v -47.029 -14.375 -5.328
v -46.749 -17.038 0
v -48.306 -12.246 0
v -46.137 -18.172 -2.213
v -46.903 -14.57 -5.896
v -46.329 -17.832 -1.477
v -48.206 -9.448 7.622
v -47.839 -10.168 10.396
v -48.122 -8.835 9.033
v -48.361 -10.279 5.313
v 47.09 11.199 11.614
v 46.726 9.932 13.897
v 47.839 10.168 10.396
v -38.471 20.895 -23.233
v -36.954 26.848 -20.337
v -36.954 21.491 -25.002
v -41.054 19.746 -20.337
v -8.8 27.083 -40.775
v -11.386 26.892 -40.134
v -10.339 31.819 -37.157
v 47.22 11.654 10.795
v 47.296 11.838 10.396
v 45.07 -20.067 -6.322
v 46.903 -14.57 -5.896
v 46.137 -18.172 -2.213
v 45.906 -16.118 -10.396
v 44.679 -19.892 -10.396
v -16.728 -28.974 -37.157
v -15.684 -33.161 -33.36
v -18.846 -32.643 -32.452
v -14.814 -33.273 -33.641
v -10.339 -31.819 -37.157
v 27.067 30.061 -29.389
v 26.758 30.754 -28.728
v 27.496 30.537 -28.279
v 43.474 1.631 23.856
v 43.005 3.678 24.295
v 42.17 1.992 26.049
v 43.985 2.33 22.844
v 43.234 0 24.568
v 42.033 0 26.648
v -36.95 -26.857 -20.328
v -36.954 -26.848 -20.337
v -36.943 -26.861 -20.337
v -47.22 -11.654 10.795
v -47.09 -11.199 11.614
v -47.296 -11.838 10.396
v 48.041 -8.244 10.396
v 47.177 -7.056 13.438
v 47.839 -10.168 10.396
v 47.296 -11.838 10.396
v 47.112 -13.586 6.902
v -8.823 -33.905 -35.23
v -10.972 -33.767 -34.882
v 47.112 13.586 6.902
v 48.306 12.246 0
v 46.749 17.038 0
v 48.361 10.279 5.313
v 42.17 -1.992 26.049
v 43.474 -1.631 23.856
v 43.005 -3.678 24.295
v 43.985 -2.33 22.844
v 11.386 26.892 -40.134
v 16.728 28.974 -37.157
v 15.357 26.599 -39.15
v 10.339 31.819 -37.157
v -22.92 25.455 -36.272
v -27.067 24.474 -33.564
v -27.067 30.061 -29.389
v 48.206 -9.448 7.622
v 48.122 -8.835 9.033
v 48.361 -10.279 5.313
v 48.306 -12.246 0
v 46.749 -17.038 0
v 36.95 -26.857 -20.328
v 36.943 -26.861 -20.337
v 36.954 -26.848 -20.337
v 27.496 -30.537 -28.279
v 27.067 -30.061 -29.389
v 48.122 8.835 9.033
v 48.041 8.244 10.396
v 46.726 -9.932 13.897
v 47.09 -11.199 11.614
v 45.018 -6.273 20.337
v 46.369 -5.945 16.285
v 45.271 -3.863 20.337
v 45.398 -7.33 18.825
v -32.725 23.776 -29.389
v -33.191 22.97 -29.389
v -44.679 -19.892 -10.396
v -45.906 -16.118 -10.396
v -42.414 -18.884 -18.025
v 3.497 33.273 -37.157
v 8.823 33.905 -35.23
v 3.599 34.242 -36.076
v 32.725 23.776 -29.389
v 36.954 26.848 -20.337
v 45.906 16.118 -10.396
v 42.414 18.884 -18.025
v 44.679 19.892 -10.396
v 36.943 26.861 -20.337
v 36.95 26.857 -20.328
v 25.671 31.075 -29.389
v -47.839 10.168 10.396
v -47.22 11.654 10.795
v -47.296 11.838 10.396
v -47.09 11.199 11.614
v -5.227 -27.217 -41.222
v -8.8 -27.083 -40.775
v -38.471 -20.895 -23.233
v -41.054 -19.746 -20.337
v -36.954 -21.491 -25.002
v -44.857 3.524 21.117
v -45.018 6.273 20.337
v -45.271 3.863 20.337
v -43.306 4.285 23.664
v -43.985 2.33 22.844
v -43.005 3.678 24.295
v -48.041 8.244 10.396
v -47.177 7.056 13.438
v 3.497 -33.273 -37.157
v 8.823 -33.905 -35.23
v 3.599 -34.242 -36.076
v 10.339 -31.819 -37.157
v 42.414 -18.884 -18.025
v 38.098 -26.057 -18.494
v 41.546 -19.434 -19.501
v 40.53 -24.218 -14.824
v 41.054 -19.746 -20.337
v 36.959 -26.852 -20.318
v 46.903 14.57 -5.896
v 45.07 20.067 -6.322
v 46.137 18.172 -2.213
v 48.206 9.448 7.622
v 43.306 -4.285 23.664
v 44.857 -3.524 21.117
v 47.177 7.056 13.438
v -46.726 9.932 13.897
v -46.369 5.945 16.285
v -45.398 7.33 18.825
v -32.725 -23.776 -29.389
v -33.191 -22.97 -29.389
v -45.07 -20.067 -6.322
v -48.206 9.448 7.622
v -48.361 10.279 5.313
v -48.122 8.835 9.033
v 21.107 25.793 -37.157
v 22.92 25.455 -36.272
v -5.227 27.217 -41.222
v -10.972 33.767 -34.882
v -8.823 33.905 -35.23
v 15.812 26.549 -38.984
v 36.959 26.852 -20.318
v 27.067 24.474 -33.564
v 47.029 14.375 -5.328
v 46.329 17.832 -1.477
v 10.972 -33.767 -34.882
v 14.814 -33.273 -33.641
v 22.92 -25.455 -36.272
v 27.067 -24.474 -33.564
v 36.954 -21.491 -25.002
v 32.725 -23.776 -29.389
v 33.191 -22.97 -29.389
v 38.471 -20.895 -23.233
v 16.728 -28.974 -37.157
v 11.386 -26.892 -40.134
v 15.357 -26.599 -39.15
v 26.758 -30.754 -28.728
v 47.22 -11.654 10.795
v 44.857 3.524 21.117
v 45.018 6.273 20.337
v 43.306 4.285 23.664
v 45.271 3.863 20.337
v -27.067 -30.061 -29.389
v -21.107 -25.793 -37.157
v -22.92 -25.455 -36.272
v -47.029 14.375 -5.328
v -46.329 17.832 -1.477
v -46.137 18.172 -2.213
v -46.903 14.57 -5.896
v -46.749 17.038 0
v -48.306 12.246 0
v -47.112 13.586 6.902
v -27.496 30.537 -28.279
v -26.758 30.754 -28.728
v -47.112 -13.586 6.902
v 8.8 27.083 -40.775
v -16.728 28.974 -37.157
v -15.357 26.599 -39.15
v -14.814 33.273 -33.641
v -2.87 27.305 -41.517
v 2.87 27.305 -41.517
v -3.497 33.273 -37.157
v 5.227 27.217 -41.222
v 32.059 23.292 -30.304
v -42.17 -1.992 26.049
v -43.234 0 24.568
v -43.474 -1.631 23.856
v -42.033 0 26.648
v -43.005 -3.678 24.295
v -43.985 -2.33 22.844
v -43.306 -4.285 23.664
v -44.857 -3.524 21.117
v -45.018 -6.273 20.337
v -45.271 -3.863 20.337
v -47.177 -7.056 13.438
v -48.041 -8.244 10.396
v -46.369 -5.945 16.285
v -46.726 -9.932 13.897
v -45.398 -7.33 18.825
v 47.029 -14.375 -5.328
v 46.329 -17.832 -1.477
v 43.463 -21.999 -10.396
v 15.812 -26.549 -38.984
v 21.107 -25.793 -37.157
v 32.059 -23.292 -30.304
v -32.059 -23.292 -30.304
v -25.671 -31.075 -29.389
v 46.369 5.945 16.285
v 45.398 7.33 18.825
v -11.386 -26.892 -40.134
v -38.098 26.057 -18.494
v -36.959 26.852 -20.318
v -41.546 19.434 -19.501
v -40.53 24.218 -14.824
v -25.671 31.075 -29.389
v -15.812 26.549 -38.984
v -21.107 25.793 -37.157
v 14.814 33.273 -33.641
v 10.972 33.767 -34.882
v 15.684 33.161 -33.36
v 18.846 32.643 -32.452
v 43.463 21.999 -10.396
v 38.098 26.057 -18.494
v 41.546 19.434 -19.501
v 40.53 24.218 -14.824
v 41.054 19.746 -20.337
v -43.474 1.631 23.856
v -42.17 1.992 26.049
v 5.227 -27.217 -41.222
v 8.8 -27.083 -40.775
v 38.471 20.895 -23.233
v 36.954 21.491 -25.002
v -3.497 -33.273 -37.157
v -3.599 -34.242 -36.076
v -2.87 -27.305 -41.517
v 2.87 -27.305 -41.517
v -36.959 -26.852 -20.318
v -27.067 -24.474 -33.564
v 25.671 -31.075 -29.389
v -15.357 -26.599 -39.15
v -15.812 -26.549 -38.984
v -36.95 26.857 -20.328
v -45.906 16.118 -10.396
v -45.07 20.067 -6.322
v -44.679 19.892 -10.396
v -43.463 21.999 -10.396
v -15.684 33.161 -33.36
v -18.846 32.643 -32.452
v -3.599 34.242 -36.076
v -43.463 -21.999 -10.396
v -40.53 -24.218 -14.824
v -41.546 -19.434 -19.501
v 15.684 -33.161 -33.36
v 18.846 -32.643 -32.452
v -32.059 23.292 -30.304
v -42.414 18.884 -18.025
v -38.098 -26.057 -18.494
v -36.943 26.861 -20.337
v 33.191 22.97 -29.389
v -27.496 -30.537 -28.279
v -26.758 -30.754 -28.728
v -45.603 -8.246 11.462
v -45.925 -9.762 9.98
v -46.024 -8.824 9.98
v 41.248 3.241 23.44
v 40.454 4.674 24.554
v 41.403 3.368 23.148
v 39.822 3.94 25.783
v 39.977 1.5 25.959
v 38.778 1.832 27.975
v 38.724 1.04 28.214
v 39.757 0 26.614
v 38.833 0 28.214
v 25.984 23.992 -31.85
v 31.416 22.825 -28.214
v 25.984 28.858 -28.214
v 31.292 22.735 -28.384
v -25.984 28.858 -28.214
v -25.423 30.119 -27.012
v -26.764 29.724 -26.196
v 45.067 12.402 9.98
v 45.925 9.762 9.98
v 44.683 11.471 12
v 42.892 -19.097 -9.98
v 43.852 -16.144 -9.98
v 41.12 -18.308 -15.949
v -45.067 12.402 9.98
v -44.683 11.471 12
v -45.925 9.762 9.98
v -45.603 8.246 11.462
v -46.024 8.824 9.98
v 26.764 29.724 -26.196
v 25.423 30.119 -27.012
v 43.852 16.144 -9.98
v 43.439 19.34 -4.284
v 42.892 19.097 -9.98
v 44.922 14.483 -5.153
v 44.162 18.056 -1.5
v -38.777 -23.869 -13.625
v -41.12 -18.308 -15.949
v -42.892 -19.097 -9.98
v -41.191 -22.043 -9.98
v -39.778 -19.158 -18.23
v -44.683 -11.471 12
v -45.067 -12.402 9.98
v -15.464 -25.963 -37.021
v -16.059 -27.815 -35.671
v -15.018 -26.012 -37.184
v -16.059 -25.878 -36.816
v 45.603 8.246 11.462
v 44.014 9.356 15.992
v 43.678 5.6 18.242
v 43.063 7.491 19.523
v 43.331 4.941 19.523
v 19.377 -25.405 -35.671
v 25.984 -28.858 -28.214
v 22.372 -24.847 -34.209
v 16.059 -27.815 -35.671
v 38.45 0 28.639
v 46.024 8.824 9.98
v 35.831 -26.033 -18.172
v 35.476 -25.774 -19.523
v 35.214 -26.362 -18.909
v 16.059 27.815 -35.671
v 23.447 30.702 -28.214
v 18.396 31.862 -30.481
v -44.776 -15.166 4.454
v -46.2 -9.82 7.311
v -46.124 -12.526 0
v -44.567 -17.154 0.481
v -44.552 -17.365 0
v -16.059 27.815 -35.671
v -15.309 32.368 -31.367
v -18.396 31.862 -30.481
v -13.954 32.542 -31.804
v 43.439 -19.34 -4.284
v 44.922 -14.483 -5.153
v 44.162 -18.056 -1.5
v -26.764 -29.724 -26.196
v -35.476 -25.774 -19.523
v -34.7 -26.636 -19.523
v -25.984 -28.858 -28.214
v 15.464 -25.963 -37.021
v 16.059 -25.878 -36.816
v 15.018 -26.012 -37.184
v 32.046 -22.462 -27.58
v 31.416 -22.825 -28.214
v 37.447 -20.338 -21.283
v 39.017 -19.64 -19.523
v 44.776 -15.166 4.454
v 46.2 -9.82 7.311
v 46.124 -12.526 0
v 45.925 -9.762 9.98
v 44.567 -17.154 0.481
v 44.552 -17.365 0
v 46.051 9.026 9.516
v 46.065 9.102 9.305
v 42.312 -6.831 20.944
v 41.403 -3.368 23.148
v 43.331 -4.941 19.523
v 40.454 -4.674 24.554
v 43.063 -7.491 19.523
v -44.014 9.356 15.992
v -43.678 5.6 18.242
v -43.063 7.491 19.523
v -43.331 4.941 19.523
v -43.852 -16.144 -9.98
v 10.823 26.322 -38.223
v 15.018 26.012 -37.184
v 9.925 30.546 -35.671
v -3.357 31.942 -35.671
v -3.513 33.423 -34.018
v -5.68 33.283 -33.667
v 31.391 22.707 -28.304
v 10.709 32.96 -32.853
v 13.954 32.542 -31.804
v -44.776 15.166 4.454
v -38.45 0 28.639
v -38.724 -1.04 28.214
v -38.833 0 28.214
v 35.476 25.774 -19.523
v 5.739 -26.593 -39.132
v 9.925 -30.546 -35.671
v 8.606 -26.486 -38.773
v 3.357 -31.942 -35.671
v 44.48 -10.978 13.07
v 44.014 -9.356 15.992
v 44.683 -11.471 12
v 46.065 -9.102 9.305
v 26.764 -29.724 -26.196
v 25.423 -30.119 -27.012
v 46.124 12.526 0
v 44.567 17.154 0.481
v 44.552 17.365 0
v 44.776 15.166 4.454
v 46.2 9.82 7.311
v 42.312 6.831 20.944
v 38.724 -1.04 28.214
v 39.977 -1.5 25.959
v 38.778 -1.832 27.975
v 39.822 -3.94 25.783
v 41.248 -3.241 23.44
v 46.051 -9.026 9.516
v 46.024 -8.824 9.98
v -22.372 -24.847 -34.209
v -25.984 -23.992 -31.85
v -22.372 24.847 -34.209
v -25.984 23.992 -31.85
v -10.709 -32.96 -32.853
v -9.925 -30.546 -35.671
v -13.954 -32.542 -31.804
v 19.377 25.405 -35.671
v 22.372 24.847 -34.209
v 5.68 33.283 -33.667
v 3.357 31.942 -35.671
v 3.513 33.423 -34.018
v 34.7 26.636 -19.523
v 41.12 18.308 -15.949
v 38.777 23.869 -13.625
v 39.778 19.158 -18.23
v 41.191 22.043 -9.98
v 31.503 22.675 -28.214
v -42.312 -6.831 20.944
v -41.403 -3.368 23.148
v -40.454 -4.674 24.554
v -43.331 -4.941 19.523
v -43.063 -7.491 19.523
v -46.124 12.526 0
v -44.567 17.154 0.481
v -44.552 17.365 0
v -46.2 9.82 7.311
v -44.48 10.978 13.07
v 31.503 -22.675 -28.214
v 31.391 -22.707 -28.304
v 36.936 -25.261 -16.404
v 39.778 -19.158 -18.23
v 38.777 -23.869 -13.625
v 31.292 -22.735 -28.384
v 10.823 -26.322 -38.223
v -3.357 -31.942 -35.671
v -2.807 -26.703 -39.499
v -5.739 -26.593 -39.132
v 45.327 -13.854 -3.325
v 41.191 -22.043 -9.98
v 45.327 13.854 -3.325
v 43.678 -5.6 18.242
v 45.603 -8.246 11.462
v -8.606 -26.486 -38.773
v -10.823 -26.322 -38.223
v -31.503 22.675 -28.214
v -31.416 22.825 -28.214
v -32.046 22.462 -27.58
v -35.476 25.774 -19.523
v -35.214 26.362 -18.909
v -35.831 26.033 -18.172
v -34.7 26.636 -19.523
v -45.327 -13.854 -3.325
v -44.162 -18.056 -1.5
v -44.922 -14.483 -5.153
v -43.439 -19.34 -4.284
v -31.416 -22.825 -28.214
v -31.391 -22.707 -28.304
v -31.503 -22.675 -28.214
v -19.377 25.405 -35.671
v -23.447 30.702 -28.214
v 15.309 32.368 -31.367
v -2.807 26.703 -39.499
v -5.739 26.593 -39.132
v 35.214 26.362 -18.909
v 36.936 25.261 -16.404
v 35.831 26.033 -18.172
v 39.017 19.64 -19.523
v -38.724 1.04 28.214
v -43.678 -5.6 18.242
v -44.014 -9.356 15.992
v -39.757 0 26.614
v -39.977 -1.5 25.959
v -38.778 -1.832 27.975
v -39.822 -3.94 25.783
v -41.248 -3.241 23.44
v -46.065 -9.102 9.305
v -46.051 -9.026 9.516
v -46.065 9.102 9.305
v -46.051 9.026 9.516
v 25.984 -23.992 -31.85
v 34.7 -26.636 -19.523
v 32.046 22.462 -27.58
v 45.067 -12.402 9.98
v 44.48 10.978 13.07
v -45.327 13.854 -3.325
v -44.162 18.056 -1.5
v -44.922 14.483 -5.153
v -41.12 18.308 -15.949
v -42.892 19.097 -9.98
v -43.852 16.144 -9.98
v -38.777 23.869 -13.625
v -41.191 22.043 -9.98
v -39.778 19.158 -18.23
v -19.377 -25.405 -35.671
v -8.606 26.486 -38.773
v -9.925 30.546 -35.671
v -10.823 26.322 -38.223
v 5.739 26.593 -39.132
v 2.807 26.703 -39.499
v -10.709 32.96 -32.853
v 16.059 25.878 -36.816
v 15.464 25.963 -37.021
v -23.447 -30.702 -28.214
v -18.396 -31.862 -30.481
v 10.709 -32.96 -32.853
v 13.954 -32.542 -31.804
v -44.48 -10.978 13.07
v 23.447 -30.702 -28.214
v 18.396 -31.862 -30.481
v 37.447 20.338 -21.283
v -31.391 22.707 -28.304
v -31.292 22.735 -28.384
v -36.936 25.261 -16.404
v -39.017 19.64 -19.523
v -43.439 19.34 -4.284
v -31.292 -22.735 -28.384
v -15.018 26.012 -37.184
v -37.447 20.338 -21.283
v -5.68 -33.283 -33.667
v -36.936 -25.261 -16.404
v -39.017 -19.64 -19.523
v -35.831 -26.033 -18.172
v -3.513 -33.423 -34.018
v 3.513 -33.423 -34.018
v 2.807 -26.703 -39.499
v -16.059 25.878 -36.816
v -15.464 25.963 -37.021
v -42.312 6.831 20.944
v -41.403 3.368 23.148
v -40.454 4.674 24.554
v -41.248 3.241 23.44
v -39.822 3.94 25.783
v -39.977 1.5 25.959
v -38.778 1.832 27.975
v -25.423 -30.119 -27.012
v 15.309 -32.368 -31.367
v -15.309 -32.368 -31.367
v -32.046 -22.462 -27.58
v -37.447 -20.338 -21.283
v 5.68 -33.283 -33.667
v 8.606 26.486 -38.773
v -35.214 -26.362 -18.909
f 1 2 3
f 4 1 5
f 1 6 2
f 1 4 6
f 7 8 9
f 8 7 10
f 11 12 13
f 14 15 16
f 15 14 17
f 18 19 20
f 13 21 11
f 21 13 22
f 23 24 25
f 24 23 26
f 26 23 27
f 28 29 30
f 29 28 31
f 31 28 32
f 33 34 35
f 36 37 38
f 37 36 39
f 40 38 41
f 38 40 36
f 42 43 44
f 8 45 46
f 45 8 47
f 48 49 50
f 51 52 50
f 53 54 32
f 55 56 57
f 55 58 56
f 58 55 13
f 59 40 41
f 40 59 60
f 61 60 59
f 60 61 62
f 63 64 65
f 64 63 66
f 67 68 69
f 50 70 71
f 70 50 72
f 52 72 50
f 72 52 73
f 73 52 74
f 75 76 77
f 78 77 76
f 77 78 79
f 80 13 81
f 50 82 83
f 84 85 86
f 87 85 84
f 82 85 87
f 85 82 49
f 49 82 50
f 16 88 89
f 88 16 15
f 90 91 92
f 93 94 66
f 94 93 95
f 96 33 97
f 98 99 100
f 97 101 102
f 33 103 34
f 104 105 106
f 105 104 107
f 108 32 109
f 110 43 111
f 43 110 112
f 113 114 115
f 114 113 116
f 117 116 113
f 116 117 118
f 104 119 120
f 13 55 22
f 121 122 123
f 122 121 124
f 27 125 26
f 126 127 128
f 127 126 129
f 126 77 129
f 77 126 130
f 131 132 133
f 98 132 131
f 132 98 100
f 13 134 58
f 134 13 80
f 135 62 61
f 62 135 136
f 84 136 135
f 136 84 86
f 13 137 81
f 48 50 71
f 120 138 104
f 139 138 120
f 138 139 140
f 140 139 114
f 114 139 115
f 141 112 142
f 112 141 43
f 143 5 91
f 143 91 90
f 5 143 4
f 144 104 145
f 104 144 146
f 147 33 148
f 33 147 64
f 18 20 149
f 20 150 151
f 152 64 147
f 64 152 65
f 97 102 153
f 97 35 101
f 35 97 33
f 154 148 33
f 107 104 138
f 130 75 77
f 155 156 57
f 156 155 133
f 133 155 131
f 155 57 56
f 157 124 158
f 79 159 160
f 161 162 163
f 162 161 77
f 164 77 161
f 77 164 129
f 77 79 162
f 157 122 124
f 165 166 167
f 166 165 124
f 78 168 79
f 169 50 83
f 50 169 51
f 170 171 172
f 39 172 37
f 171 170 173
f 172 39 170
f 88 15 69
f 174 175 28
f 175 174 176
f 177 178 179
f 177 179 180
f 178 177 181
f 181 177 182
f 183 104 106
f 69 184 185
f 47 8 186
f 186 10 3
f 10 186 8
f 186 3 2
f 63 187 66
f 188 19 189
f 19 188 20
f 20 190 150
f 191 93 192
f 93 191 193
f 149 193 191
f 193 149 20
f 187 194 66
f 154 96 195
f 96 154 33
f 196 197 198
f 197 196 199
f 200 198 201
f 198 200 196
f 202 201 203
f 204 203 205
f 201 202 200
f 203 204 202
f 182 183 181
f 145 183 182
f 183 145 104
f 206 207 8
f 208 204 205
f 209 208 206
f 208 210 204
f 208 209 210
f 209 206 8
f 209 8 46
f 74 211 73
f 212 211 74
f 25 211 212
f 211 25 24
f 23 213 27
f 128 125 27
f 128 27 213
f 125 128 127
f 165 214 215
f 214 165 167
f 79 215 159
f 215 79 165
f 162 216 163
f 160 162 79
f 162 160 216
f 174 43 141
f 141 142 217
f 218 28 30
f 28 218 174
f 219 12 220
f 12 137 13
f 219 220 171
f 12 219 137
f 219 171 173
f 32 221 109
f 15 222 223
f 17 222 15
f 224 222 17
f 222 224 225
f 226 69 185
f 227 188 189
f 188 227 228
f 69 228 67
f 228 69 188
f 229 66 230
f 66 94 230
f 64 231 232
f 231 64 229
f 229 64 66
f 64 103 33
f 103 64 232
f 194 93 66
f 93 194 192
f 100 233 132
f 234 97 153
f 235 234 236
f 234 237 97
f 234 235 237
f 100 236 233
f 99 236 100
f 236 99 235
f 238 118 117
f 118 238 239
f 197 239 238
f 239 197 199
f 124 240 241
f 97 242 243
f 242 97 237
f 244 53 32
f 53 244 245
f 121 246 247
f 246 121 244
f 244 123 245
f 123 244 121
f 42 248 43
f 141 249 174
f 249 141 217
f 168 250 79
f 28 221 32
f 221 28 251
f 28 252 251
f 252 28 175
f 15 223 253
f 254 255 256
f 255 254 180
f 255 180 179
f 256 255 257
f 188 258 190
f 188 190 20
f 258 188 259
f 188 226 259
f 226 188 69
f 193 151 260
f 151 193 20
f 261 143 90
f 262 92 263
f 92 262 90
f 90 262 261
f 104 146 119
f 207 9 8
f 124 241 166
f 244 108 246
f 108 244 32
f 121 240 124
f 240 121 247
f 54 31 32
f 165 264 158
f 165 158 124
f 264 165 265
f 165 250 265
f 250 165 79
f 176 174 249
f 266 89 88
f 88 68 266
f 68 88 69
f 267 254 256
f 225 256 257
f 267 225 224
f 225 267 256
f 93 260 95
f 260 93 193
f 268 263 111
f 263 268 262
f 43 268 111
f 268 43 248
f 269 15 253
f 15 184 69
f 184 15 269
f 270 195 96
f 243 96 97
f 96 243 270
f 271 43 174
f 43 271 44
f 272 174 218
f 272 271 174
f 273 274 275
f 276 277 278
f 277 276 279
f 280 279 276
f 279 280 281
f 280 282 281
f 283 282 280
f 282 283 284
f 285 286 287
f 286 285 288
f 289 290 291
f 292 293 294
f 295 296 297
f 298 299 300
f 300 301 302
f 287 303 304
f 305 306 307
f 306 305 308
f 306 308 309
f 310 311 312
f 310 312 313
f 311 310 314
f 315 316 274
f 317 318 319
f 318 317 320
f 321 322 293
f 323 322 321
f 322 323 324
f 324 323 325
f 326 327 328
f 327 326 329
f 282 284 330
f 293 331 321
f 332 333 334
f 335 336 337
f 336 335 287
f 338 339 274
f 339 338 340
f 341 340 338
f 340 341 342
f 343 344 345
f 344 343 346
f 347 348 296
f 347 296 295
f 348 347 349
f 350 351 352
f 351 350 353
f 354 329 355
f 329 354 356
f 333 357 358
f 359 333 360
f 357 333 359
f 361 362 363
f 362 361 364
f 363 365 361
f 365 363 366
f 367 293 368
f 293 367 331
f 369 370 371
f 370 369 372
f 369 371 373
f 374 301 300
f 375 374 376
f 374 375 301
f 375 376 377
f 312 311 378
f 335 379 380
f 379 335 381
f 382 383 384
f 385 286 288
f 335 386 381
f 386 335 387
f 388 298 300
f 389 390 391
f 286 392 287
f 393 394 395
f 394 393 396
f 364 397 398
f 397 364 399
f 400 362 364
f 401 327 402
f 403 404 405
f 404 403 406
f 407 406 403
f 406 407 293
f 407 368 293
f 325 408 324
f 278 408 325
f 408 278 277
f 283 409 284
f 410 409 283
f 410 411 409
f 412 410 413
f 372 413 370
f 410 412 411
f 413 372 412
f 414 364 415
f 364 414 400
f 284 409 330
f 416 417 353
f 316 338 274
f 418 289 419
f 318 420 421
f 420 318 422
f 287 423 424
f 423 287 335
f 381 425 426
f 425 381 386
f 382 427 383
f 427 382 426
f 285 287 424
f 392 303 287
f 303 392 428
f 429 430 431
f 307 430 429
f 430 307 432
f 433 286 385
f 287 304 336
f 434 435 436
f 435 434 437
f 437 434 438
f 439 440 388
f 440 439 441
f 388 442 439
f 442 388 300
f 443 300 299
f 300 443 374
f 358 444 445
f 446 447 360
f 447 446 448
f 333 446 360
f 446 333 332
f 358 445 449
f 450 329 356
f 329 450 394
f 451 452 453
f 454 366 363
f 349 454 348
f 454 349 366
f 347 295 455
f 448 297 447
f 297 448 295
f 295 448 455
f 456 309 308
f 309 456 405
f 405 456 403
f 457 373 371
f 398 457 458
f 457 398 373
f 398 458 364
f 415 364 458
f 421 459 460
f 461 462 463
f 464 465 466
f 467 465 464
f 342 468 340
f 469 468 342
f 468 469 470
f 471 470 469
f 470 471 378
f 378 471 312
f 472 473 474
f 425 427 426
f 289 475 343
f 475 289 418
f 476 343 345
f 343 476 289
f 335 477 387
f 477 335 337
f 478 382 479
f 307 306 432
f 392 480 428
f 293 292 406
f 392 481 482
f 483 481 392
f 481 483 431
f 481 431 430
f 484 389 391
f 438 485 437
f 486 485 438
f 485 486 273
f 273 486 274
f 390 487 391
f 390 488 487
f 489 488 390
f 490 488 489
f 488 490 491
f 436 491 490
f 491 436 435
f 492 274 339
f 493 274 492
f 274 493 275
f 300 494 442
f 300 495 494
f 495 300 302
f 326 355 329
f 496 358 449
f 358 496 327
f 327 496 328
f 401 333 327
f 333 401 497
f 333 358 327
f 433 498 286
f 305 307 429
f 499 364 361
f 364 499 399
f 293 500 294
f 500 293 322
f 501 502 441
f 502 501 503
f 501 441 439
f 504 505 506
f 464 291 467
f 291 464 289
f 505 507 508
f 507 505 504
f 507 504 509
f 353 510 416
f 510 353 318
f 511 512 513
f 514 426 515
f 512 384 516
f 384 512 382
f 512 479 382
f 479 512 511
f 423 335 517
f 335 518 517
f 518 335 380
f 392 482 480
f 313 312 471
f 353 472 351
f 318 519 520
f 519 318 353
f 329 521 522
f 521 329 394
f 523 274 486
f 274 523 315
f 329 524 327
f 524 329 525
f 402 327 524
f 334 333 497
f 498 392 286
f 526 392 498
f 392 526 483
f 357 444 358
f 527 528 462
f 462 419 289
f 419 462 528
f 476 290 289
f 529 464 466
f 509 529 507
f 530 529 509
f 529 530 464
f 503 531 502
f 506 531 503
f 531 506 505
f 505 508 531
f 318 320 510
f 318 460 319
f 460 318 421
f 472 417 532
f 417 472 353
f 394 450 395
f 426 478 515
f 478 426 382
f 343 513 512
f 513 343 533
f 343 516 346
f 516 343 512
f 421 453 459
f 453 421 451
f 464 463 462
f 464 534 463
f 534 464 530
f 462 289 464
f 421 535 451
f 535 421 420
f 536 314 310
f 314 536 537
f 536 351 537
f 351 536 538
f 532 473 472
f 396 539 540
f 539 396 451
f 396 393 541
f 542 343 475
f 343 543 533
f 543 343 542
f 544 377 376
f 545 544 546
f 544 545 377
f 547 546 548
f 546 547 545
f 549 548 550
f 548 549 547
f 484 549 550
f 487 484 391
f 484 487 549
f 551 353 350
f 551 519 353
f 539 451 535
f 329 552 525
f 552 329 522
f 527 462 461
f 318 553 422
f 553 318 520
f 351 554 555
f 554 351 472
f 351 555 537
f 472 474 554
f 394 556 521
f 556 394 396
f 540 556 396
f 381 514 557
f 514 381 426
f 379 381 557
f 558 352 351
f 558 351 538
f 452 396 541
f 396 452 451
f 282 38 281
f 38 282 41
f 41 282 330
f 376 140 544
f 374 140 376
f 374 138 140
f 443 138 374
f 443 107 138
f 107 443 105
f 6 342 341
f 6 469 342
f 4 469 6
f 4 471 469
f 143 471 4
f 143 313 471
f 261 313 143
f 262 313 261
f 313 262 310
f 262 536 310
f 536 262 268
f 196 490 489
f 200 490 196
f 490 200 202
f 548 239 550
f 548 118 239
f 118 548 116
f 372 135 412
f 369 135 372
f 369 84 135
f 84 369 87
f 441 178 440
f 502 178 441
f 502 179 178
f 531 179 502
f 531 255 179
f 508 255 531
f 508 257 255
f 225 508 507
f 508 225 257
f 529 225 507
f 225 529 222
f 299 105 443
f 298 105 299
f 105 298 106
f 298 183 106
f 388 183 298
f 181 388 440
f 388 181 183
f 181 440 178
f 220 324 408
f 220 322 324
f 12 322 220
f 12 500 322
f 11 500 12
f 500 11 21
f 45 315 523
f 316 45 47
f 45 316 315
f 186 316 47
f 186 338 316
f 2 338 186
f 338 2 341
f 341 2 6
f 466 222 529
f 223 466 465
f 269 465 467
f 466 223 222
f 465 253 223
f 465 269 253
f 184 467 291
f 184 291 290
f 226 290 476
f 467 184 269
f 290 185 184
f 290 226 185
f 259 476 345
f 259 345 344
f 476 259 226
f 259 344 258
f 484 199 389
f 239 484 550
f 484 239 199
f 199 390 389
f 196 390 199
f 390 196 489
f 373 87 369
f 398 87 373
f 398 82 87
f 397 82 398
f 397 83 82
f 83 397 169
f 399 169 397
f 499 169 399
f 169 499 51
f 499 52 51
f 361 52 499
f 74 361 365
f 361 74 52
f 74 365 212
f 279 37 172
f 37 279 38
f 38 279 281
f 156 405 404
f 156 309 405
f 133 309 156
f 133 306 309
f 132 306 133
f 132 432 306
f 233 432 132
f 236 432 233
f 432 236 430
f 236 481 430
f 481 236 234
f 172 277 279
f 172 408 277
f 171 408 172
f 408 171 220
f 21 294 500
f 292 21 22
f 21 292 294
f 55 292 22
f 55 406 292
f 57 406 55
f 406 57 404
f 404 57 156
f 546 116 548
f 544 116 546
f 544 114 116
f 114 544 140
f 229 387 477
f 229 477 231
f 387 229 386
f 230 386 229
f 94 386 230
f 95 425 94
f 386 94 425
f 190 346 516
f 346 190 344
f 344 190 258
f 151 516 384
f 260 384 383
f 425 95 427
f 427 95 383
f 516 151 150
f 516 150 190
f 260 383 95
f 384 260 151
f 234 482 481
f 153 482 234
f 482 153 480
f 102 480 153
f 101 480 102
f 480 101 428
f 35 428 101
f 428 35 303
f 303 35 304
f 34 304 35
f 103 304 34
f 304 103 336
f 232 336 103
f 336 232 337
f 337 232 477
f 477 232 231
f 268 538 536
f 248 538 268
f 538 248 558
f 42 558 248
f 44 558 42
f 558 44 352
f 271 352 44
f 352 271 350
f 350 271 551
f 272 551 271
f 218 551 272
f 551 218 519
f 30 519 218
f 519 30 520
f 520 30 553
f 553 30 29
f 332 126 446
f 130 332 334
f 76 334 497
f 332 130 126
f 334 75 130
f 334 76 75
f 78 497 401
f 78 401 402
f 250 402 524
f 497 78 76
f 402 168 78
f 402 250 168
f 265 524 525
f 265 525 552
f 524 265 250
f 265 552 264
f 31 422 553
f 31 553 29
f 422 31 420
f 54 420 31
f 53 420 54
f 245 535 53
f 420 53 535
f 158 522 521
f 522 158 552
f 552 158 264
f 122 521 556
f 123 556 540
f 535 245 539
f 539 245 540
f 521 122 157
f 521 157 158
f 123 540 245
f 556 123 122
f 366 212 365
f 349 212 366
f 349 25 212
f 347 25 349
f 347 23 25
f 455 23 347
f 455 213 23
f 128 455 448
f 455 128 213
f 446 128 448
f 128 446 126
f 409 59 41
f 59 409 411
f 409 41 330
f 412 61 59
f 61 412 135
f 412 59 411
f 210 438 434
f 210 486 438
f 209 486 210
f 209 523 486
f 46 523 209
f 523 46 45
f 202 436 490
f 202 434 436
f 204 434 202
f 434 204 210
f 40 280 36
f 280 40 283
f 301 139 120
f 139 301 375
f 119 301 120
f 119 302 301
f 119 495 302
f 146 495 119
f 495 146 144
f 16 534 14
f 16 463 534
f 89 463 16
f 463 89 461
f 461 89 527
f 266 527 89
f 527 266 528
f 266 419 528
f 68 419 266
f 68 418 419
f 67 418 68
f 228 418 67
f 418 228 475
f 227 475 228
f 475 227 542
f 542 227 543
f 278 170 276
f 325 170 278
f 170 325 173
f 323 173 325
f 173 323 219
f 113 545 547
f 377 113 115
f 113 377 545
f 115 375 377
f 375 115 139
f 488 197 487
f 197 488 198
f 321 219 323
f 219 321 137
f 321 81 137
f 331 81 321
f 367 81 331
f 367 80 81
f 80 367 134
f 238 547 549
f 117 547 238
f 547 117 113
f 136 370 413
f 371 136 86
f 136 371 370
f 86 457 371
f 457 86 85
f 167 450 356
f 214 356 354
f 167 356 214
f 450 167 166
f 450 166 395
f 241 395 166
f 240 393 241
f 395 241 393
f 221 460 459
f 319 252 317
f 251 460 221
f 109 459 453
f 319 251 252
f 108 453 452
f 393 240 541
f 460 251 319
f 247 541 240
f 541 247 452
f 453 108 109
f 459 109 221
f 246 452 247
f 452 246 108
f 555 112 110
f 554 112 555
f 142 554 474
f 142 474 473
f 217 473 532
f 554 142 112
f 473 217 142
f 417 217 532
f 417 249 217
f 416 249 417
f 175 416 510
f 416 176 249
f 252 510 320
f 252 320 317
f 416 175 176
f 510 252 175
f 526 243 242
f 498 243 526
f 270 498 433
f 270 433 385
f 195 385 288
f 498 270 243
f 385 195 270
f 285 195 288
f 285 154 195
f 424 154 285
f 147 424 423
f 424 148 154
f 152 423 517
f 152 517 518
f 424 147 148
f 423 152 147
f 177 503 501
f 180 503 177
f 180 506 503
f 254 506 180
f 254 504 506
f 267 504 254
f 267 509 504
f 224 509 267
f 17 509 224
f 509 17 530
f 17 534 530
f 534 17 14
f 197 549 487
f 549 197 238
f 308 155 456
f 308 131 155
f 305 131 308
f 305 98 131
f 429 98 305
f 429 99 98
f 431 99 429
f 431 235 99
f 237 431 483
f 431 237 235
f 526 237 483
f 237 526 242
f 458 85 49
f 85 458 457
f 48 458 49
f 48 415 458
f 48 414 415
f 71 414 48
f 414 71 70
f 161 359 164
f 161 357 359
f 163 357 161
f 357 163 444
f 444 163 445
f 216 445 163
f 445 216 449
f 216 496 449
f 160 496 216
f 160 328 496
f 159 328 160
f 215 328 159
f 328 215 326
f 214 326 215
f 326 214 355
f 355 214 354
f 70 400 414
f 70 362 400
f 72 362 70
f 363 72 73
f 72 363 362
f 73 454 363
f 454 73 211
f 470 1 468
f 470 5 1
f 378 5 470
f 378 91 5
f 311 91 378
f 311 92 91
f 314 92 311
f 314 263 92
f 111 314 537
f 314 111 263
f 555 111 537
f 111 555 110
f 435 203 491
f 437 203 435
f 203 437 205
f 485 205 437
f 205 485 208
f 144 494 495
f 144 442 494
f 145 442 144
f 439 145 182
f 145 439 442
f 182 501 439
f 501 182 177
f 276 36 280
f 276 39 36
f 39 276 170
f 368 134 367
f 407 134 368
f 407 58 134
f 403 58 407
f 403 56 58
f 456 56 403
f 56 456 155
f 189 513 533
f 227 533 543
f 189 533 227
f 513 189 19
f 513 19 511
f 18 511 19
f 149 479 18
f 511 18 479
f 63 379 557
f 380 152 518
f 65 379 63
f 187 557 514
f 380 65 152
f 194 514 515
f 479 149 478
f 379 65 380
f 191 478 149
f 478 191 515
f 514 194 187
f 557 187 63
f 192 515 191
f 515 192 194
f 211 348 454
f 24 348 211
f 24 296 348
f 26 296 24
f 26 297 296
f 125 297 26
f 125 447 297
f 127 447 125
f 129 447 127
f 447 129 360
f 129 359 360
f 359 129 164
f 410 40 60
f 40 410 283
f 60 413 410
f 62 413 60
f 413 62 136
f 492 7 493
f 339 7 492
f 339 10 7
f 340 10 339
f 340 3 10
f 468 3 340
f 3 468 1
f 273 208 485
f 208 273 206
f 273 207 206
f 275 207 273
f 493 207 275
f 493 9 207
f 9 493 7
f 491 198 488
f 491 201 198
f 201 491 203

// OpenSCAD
intersection(){
  difference(){
    sphere(r=50);
    sphere(r=48);
    translate([0,0,50]){
      sphere(r=10);
    }
  }
  union(){
    difference(){
      scale([1.8,.4,1]){
        cylinder(r1=100,r2=0,h=100,center=true);
      }
      scale([1.7,.3,1]){
        cylinder(r1=100,r2=0,h=100,center=true);
      }
    }
  }
}
